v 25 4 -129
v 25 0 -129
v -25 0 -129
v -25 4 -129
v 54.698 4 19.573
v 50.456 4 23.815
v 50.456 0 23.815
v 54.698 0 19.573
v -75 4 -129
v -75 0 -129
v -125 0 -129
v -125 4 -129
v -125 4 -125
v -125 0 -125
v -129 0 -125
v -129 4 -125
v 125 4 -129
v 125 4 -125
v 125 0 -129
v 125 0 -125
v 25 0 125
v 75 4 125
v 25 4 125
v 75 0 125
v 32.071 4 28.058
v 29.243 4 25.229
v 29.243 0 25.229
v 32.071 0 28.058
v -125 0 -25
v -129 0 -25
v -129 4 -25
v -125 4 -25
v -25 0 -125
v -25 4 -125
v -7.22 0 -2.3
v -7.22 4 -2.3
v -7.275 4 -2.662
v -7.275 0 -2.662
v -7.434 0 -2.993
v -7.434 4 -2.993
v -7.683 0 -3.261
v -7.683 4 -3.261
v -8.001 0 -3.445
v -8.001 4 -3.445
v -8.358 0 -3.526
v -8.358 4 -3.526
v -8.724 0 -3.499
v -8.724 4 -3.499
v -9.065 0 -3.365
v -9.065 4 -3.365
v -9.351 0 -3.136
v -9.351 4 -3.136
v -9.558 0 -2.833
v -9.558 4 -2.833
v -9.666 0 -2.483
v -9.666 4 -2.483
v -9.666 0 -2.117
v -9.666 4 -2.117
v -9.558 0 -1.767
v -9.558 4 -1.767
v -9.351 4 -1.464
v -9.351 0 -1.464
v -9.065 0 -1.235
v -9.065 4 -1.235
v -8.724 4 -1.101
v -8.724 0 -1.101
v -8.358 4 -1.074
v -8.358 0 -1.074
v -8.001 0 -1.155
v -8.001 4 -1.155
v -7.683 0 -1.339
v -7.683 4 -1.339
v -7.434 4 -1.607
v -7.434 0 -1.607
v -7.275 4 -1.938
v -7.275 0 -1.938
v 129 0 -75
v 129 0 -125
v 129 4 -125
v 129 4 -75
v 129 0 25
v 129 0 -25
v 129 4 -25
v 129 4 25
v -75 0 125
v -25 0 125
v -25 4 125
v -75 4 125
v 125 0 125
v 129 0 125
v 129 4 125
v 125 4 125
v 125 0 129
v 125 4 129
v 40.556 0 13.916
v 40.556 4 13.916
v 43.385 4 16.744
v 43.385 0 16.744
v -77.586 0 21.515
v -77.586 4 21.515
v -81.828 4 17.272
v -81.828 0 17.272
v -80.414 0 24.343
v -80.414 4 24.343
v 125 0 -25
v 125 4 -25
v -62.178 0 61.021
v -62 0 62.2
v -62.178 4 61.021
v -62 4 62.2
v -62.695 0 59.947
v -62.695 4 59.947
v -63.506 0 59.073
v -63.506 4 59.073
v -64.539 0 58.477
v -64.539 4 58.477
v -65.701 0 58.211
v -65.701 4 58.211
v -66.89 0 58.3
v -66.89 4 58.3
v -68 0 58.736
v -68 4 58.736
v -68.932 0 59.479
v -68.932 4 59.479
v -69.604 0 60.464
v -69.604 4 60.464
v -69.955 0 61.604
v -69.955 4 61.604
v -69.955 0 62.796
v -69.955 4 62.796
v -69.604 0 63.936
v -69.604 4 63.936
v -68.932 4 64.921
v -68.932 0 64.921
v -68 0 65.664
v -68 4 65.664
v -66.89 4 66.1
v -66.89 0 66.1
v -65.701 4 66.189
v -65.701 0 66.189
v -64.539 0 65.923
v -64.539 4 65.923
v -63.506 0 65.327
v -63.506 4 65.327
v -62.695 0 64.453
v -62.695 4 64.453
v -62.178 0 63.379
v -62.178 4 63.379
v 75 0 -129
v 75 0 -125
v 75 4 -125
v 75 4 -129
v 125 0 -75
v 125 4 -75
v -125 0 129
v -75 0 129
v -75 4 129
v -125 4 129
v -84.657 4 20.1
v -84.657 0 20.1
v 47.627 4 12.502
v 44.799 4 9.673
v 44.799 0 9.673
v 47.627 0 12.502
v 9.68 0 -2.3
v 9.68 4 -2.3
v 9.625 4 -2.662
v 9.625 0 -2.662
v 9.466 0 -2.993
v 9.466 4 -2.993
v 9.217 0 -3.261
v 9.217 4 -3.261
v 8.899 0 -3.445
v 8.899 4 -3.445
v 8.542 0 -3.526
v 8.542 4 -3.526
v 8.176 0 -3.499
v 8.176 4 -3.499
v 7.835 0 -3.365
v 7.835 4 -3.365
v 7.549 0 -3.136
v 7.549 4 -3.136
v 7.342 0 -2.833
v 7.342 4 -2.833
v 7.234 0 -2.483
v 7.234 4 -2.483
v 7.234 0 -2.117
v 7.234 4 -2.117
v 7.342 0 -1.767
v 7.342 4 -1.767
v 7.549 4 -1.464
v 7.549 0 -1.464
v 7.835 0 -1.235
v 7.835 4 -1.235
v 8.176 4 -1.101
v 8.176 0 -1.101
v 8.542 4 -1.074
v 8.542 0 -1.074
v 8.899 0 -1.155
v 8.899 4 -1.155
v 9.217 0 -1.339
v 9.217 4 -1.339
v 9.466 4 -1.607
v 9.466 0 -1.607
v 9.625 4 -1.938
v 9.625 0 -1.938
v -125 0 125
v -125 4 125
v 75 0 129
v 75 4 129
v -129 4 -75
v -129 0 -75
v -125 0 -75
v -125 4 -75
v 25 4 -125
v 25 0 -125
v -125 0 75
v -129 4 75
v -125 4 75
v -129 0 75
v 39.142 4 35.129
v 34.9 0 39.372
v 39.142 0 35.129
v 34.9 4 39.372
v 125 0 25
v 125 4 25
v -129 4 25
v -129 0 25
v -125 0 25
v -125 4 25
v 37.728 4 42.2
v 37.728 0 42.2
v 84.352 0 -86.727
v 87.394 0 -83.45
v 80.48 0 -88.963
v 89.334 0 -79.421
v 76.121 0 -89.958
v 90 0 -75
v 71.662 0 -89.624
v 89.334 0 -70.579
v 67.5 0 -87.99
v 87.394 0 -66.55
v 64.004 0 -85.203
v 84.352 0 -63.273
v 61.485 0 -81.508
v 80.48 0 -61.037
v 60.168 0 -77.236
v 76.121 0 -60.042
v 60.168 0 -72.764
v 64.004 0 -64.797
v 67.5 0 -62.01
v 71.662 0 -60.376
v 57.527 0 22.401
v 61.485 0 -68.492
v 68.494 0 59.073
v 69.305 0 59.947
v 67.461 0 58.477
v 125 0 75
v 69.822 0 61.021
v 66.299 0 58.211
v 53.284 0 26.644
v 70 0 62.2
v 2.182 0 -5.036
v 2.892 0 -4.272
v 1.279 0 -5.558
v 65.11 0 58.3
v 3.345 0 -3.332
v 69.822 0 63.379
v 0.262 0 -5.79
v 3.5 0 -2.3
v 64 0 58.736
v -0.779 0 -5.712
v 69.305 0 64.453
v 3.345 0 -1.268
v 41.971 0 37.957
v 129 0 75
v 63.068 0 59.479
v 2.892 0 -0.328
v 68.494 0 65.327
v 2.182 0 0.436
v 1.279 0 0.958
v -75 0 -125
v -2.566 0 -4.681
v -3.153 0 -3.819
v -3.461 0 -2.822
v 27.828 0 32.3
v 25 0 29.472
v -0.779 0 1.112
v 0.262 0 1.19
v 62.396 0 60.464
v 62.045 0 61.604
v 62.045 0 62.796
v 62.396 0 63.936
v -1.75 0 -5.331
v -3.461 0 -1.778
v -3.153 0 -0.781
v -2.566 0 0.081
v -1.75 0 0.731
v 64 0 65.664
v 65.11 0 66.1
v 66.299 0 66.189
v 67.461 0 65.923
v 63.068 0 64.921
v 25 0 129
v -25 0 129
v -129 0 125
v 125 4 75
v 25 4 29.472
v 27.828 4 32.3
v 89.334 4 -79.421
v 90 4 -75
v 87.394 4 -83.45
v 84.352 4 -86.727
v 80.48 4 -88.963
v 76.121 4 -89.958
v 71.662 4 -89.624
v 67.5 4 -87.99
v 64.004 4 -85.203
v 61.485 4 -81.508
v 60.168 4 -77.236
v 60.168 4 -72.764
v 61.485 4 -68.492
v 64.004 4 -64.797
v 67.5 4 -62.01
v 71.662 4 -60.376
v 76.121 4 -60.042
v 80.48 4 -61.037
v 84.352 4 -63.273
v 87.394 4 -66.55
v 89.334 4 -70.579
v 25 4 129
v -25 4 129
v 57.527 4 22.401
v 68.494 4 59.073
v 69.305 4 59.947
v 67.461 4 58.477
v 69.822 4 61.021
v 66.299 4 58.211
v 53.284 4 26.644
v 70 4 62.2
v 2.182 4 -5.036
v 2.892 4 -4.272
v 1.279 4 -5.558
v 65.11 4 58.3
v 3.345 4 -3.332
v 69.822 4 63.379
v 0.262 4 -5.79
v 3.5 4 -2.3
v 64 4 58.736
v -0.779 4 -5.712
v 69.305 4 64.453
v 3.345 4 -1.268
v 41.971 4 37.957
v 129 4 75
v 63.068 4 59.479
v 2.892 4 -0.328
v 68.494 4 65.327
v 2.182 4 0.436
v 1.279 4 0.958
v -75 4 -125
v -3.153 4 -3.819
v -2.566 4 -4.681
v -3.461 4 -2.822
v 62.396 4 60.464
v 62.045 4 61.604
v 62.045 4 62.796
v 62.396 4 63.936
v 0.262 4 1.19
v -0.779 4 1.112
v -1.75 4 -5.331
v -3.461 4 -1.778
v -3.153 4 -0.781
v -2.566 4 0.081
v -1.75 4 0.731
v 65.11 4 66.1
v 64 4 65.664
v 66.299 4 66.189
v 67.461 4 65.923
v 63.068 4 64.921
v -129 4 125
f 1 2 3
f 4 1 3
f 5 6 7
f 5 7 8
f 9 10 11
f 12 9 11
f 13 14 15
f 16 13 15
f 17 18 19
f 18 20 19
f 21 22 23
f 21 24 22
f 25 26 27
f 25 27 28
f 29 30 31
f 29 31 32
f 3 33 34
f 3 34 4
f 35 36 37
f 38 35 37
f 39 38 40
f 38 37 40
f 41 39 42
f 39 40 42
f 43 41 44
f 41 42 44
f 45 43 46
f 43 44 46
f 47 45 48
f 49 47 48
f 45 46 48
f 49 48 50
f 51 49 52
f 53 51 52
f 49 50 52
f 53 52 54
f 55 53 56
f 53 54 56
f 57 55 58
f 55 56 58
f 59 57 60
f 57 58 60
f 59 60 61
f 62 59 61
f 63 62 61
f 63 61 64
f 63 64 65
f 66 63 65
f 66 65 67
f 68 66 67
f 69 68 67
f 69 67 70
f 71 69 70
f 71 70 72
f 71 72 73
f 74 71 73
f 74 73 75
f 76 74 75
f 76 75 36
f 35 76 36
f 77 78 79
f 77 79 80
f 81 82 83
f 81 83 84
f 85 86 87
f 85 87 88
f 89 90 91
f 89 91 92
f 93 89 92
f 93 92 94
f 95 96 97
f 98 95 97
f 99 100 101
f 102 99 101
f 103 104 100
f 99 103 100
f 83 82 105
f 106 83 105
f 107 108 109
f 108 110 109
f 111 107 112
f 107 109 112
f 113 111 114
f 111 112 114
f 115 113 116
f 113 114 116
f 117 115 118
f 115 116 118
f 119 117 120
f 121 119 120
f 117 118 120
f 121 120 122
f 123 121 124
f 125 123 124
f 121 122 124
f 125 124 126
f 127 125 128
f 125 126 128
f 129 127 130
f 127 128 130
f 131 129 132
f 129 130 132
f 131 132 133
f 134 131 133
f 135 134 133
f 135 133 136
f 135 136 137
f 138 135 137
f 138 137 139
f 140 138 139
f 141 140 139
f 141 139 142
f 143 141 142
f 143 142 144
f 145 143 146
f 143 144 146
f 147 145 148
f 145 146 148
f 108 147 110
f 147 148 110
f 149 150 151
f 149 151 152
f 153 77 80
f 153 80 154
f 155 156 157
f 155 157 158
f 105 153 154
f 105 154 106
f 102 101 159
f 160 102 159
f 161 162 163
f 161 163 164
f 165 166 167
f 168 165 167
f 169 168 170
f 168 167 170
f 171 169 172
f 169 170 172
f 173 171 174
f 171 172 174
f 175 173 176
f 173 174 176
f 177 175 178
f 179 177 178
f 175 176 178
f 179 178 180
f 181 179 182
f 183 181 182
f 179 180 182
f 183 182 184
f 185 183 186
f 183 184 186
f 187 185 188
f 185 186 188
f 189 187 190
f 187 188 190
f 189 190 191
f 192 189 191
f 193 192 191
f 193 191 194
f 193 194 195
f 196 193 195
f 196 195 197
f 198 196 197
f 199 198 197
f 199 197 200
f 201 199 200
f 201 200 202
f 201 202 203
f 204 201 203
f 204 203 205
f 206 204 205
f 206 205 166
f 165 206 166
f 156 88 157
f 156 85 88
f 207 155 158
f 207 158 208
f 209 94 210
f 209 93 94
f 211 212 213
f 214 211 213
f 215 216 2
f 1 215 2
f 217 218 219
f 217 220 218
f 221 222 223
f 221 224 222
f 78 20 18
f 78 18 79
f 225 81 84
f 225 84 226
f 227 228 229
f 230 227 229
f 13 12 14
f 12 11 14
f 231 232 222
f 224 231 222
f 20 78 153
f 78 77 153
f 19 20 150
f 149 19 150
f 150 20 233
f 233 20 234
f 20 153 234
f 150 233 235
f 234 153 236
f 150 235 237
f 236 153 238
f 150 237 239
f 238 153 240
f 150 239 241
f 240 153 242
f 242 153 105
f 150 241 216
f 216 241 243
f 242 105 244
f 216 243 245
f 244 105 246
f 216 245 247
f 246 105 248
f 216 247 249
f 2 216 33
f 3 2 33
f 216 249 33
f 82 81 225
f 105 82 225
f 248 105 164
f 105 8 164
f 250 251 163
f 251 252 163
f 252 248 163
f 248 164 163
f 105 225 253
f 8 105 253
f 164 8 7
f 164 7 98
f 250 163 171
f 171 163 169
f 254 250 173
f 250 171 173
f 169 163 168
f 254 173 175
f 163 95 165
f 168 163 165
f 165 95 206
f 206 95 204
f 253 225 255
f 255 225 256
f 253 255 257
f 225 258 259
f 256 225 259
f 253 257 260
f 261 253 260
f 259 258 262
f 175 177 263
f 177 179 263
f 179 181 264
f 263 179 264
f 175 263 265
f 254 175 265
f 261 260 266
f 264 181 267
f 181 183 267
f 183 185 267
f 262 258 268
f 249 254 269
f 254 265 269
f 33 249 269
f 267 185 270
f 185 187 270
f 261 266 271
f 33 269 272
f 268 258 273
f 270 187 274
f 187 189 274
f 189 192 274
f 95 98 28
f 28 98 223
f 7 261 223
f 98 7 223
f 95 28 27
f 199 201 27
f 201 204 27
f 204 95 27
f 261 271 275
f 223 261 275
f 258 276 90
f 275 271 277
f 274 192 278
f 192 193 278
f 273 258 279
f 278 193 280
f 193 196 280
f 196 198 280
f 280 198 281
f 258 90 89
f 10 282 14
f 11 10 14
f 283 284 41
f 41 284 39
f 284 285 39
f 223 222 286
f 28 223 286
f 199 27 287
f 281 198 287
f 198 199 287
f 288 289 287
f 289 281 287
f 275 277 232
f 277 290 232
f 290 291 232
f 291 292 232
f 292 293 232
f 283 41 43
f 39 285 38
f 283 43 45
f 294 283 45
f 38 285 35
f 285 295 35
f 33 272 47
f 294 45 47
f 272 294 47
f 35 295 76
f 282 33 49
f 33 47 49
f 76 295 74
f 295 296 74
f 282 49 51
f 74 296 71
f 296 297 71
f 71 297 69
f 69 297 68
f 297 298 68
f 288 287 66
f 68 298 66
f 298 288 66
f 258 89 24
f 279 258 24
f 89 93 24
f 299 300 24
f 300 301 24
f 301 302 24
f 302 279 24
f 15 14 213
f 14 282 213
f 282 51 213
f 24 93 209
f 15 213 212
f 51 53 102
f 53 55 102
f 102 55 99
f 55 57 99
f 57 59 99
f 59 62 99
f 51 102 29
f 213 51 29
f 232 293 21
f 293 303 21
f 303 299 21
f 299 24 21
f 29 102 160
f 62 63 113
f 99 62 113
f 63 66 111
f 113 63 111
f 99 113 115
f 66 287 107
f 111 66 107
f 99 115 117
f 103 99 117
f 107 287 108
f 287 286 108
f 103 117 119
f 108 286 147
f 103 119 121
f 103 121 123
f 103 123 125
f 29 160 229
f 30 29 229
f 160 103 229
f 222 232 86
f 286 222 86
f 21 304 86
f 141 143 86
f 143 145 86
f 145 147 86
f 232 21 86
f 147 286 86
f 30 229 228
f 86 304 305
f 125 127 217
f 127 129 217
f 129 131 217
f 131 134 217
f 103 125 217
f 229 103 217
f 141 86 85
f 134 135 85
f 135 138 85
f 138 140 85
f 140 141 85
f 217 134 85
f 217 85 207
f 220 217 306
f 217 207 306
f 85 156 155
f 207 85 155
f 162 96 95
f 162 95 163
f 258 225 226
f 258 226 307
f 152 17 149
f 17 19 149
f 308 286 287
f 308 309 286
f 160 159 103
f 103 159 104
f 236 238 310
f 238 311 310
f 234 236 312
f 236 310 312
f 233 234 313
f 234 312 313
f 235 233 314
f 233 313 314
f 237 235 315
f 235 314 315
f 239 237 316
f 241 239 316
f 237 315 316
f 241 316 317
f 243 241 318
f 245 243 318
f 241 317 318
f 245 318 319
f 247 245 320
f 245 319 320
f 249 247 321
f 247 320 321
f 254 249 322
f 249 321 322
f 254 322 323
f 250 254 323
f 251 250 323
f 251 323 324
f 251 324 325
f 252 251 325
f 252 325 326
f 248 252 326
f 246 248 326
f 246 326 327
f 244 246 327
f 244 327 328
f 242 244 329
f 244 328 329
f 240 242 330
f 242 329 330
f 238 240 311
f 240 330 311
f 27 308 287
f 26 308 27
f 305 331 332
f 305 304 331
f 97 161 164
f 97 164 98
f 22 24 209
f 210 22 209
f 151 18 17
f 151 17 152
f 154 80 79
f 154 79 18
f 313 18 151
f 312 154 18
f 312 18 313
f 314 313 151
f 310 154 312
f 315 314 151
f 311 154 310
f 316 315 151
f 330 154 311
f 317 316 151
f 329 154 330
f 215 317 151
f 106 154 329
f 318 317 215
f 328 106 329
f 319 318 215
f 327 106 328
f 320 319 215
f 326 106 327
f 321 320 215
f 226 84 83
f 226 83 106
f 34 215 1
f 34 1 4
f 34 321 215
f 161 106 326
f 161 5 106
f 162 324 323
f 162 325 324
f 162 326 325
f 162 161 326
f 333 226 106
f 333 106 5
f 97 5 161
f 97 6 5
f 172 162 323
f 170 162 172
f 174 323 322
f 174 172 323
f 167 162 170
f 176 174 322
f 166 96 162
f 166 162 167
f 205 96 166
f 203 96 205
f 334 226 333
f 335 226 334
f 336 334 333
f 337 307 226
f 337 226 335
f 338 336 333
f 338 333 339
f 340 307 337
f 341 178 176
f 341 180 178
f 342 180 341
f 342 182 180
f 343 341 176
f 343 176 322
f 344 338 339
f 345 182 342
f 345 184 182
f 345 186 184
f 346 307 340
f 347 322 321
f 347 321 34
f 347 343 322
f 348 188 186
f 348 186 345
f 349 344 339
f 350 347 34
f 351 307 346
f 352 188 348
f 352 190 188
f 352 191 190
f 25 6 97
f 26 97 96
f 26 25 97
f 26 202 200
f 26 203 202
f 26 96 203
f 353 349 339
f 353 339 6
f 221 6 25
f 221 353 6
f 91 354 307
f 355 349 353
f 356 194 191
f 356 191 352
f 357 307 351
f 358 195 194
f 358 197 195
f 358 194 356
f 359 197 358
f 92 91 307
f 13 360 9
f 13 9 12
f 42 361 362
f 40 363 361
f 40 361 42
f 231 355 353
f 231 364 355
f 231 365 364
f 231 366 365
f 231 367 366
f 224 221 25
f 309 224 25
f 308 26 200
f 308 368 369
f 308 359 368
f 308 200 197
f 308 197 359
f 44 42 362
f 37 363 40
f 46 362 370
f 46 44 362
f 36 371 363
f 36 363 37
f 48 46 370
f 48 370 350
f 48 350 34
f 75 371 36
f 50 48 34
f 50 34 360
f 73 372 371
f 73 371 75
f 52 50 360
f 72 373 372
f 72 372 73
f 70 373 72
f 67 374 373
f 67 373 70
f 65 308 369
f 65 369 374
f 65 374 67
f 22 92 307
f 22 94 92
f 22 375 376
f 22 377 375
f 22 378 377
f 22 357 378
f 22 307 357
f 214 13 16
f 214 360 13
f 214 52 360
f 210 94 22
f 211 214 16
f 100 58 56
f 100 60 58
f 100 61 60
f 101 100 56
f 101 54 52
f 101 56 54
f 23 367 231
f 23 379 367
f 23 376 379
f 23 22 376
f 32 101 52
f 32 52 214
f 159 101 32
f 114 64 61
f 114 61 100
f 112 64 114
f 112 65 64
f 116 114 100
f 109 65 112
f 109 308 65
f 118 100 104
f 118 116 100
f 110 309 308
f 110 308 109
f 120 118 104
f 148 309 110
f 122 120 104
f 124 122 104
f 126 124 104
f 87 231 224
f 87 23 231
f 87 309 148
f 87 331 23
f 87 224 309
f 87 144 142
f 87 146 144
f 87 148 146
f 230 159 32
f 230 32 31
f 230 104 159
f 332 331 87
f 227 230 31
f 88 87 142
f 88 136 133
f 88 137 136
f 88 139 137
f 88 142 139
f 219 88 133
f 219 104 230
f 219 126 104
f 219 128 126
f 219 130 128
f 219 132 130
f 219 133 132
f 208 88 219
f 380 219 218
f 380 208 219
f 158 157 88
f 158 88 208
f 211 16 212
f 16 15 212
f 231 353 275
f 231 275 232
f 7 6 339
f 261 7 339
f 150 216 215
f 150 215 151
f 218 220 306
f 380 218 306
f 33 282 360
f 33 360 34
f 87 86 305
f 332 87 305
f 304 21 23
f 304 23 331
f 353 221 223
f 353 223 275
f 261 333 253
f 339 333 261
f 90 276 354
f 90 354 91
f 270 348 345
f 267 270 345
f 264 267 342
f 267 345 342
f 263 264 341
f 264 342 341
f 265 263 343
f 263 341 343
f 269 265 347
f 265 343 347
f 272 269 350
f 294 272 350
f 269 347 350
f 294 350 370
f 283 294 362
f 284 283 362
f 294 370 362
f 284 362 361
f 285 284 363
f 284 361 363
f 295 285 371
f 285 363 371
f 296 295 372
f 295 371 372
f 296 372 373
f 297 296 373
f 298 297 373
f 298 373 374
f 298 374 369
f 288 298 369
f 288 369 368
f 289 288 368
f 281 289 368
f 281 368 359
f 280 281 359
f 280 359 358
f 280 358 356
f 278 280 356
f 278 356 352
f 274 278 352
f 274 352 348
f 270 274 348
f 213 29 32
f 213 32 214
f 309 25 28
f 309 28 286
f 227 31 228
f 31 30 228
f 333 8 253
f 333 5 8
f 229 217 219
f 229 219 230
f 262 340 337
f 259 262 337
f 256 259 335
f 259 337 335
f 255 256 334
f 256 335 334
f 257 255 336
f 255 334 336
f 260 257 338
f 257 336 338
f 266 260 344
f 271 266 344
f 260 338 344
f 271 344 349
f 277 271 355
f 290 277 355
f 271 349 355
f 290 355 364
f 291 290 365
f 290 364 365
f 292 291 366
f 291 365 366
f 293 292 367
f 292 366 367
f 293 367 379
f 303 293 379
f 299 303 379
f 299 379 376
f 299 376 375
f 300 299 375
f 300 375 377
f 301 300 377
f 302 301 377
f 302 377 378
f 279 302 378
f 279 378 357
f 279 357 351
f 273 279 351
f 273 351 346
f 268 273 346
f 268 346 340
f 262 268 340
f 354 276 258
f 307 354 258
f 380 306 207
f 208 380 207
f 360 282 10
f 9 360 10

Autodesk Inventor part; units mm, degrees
ref_plane "YZ Plane" through (0, 0, 0) normal (1, 0, 0) x (0, 1, 0)
ref_plane "XZ Plane" through (0, 0, 0) normal (0, 1, 0) x (-1, 0, 0)
ref_plane "XY Plane" through (0, 0, 0) normal (0, 0, 1) x (1, 0, 0)
sketch "Sketch1" plane through (0, 0, 0) normal (0, 1, 0) x (-1, 0, 0)
  line L0 (-125, 125) -> (125, 125)
  line L1 (125, 125) -> (125, -125)
  line L2 (125, -125) -> (-125, -125)
  line L3 (-125, -125) -> (-125, 125)
  line L4 (-125, 125) -> (125, -125) construction
  line L5 (125, 125) -> (-125, -125) construction
  line L6 (125, -125) -> (75, -125)
  line L7 (75, -125) -> (75, -129)
  line L8 (75, -129) -> (125, -129)
  line L9 (125, -129) -> (125, -125)
  line L10 (125, -125) -> (129, -125)
  line L11 (129, -125) -> (129, -75)
  line L12 (129, -75) -> (125, -75)
  line L13 (125, -75) -> (125, -125)
  line L14 (-125, -125) -> (-129, -125)
  line L15 (-129, -125) -> (-129, -75)
  line L16 (-129, -75) -> (-125, -75)
  line L17 (-125, -75) -> (-125, -125)
  line L18 (125, 125) -> (75, 125)
  line L19 (75, 125) -> (75, 129)
  line L20 (75, 129) -> (125, 129)
  line L21 (125, 129) -> (125, 125)
  line L22 (75, -129) -> (75, -125)
  line L23 (75, -125) -> (25, -125)
  line L24 (25, -125) -> (25, -129)
  line L25 (25, -129) -> (75, -129)
  line L26 (25, -129) -> (25, -125)
  line L27 (25, -125) -> (-25, -125)
  line L28 (-25, -125) -> (-25, -129)
  line L29 (-25, -129) -> (25, -129)
  line L30 (-25, -129) -> (-25, -125)
  line L31 (-25, -125) -> (-75, -125)
  line L32 (-75, -125) -> (-75, -129)
  line L33 (-75, -129) -> (-25, -129)
  line L34 (-75, -129) -> (-75, -125)
  line L35 (-75, -125) -> (-125, -125)
  line L36 (-125, -125) -> (-125, -129)
  line L37 (-125, -129) -> (-75, -129)
  line L38 (125, -75) -> (129, -75)
  line L39 (125, -25) -> (125, -75)
  line L40 (129, -25) -> (125, -25)
  line L41 (129, -75) -> (129, -25)
  line L42 (125, -25) -> (129, -25)
  line L43 (125, 25) -> (125, -25)
  line L44 (129, 25) -> (125, 25)
  line L45 (129, -25) -> (129, 25)
  line L46 (125, 25) -> (129, 25)
  line L47 (125, 75) -> (125, 25)
  line L48 (129, 75) -> (125, 75)
  line L49 (129, 25) -> (129, 75)
  line L50 (125, 75) -> (129, 75)
  line L51 (125, 125) -> (125, 75)
  line L52 (129, 125) -> (125, 125)
  line L53 (129, 75) -> (129, 125)
  line L54 (-125, -75) -> (-129, -75)
  line L55 (-129, -75) -> (-129, -25)
  line L56 (-129, -25) -> (-125, -25)
  line L57 (-125, -25) -> (-125, -75)
  line L58 (-125, -25) -> (-129, -25)
  line L59 (-129, -25) -> (-129, 25)
  line L60 (-129, 25) -> (-125, 25)
  line L61 (-125, 25) -> (-125, -25)
  line L62 (-125, 25) -> (-129, 25)
  line L63 (-129, 25) -> (-129, 75)
  line L64 (-129, 75) -> (-125, 75)
  line L65 (-125, 75) -> (-125, 25)
  line L66 (-125, 75) -> (-129, 75)
  line L67 (-129, 75) -> (-129, 125)
  line L68 (-129, 125) -> (-125, 125)
  line L69 (-125, 125) -> (-125, 75)
  line L70 (75, 125) -> (25, 125)
  line L71 (25, 125) -> (25, 129)
  line L72 (25, 129) -> (75, 129)
  line L73 (75, 129) -> (75, 125)
  line L74 (25, 125) -> (-25, 125)
  line L75 (-25, 125) -> (-25, 129)
  line L76 (-25, 129) -> (25, 129)
  line L77 (25, 129) -> (25, 125)
  line L78 (-25, 125) -> (-75, 125)
  line L79 (-75, 125) -> (-75, 129)
  line L80 (-75, 129) -> (-25, 129)
  line L81 (-25, 129) -> (-25, 125)
  line L82 (-75, 125) -> (-125, 125)
  line L83 (-125, 125) -> (-125, 129)
  line L84 (-125, 129) -> (-75, 129)
  line L85 (-75, 129) -> (-75, 125)
  point P0 (0, 0)
  dimension "d0" = 250
  dimension "d1" = 250
  dimension "d2" = 50
  dimension "d3" = 4
  dimension "d4" = 4
  dimension "d5" = 50
  dimension "d6" = 4
  dimension "d7" = 50
  dimension "d8" = 50
  dimension "d9" = 4
  dimension "d12" = 50
  dimension "d19" = 50
  dimension "d26" = 50
  dimension "d33" = 50
extrude "Extrusion1" add sketch "Sketch1" along normal blind 4 contours L83 L84 L79 L0 | L0 L1 L2 L3 | L3 L64 L67 L68 | L75 L76 L71 L0 | L3 L56 L59 L60 | L19 L20 L21 L0 | L3 L14 L15 L16 | L52 L53 L48 L1 | L2 L32 L37 L36 | L44 L45 L40 L1 | L2 L24 L29 L28 | L12 L11 L10 L1 | L2 L9 L8 L7
sketch "Sketch2" plane through (0, 4, 0) normal (0, 1, 0) x (1, 0, 0)
  line L0 (25, -125) -> (75, -125) construction
  circle A0 centre (0, 2.3) radius 3.5
  line L1 (-8.45, 2.3) -> (8.45, 2.3) construction
  line L2 (-8.45, 1.0705) -> (8.45, 1.0705) construction
  line L3 (8.45, 3.5295) -> (-8.45, 3.5295) construction
  arc A1 (-8.45, 3.5295) -> (-8.45, 1.0705) centre (-8.45, 2.3) ccw construction
  arc A2 (8.45, 1.0705) -> (8.45, 3.5295) centre (8.45, 2.3) ccw construction
  circle A3 centre (8.45, 2.3) radius 1.2295
  circle A4 centre (-8.45, 2.3) radius 1.2295
  circle A5 centre (-66, -62.2) radius 4
  circle A6 centre (66, -62.2) radius 4
  line L4 (0, 180.6) -> (0, -180.6) construction
  line L5 (-93.2324, -124) -> (95.467, -124) construction
  line L6 (-129, -125) -> (-125, -125) projected
  line L7 (25, -29.4721) -> (29.2426, -25.2294)
  line L8 (44.799, -9.6731) -> (47.6274, -12.5015)
  line L9 (47.6274, -12.5015) -> (43.3848, -16.7442)
  line L10 (27.8284, -32.3005) -> (25, -29.4721)
  line L11 (34.8995, -39.3716) -> (39.1421, -35.1289)
  line L12 (54.6985, -19.5726) -> (57.5269, -22.401)
  line L13 (57.5269, -22.401) -> (53.2843, -26.6437)
  line L14 (37.7279, -42.2) -> (34.8995, -39.3716)
  line L15 (40.5563, -13.9157) -> (43.3848, -16.7442)
  line L16 (29.2426, -25.2294) -> (32.0711, -28.0579)
  line L17 (39.1421, -35.1289) -> (41.9706, -37.9574)
  line L18 (50.4558, -23.8152) -> (53.2843, -26.6437)
  line L19 (40.5563, -13.9157) -> (44.799, -9.6731)
  line L20 (29.2426, -25.2294) -> (40.5563, -13.9157) construction
  line L21 (43.3848, -16.7442) -> (32.0711, -28.0579) construction
  line L22 (50.4558, -23.8152) -> (54.6985, -19.5726)
  line L23 (53.2843, -26.6437) -> (41.9706, -37.9574) construction
  line L24 (32.0711, -28.0579) -> (27.8284, -32.3005)
  line L25 (39.1421, -35.1289) -> (50.4558, -23.8152) construction
  line L26 (41.9706, -37.9574) -> (37.7279, -42.2)
  point P0 (0, 0)
  point P1 (26.4142, -30.8863)
  dimension "d46" = 7
  dimension "d47" = 16.9
  dimension "d48" = 1.2295
  dimension "d52" = 8
  dimension "d53" = 132
  dimension "d54" = 61.8
  dimension "d55" = 1
  dimension "d56" = 64.5
  dimension "d57" = 10
  dimension "d58" = 4
  dimension "d59" = 6
  dimension "d60" = 6
  dimension "d61" = 45
  dimension "d62" = 20
  dimension "d63" = 28
  dimension "d64" = 25
extrude "Extrusion2" cut sketch "Sketch2" against normal up to next
sketch "Sketch3" plane through (0, 4, 0) normal (0, 1, 0) x (1, 0, 0)
  point P0 (0, 0)
sketch "Sketch4" plane through (0, 4, 0) normal (0, 1, 0) x (1, 0, 0)
  circle A0 centre (75, 75) radius 15
  line L0 (125, 25) -> (125, 75) projected
  line L1 (75, 125) -> (25, 125) projected
  point P0 (0, 0)
  dimension "d65" = 30
  dimension "d66" = 50
  dimension "d67" = 50
extrude "Extrusion3" cut sketch "Sketch4" against normal through all
sketch "Sketch5" plane through (0, 4, 0) normal (0, 1, 0) x (1, 0, 0)
  circle A0 centre (75, 75) radius 15 projected
  line L0 (54.6985, -19.5726) -> (57.5269, -22.401) projected
  line L1 (57.5269, -22.401) -> (53.2843, -26.6437) projected
  line L2 (53.2843, -26.6437) -> (50.4558, -23.8152) projected
  line L3 (50.4558, -23.8152) -> (54.6985, -19.5726) projected
  circle A1 centre (8.45, 2.3) radius 1.2295 projected
  circle A2 centre (0, 2.3) radius 3.5 projected
  line L4 (39.1421, -35.1289) -> (41.9706, -37.9574) projected
  line L5 (41.9706, -37.9574) -> (37.7279, -42.2) projected
  line L6 (37.7279, -42.2) -> (34.8995, -39.3716) projected
  line L7 (34.8995, -39.3716) -> (39.1421, -35.1289) projected
  line L8 (44.799, -9.6731) -> (47.6274, -12.5015) projected
  line L9 (47.6274, -12.5015) -> (43.3848, -16.7442) projected
  line L10 (43.3848, -16.7442) -> (40.5563, -13.9157) projected
  line L11 (40.5563, -13.9157) -> (44.799, -9.6731) projected
  circle A3 centre (66, -62.2) radius 4 projected
  circle A4 centre (-8.45, 2.3) radius 1.2295 projected
  circle A5 centre (-66, -62.2) radius 4 projected
  line L12 (29.2426, -25.2294) -> (32.0711, -28.0579) projected
  line L13 (32.0711, -28.0579) -> (27.8284, -32.3005) projected
  line L14 (27.8284, -32.3005) -> (25, -29.4721) projected
  line L15 (25, -29.4721) -> (29.2426, -25.2294) projected
  line L16 (-129, -125) -> (-125, -125) projected
  line L17 (-125, -125) -> (-125, -129) projected
  line L18 (-125, -129) -> (-75, -129) projected
  line L19 (-75, -129) -> (-75, -125) projected
  line L20 (-75, -125) -> (-25, -125) projected
  line L21 (-25, -125) -> (-25, -129) projected
  line L22 (-25, -129) -> (25, -129) projected
  line L23 (25, -129) -> (25, -125) projected
  line L24 (25, -125) -> (75, -125) projected
  line L25 (75, -125) -> (75, -129) projected
  line L26 (75, -129) -> (125, -129) projected
  line L27 (125, -129) -> (125, -125) projected
  line L28 (125, -125) -> (129, -125) projected
  line L29 (129, -125) -> (129, -75) projected
  line L30 (129, -75) -> (125, -75) projected
  line L31 (125, -75) -> (125, -25) projected
  line L32 (125, -25) -> (129, -25) projected
  line L33 (129, -25) -> (129, 25) projected
  line L34 (129, 25) -> (125, 25) projected
  line L35 (125, 25) -> (125, 75) projected
  line L36 (125, 75) -> (129, 75) projected
  line L37 (129, 75) -> (129, 125) projected
  line L38 (129, 125) -> (125, 125) projected
  line L39 (125, 125) -> (125, 129) projected
  line L40 (125, 129) -> (75, 129) projected
  line L41 (75, 129) -> (75, 125) projected
  line L42 (75, 125) -> (25, 125) projected
  line L43 (25, 125) -> (25, 129) projected
  line L44 (25, 129) -> (-25, 129) projected
  line L45 (-25, 129) -> (-25, 125) projected
  line L46 (-25, 125) -> (-75, 125) projected
  line L47 (-75, 125) -> (-75, 129) projected
  line L48 (-75, 129) -> (-125, 129) projected
  line L49 (-125, 129) -> (-125, 125) projected
  line L50 (-125, 125) -> (-129, 125) projected
  line L51 (-129, 125) -> (-129, 75) projected
  line L52 (-129, 75) -> (-125, 75) projected
  line L53 (-125, 75) -> (-125, 25) projected
  line L54 (-125, 25) -> (-129, 25) projected
  line L55 (-129, 25) -> (-129, -25) projected
  line L56 (-129, -25) -> (-125, -25) projected
  line L57 (-125, -25) -> (-125, -75) projected
  line L58 (-125, -75) -> (-129, -75) projected
  line L59 (-129, -75) -> (-129, -125) projected
  line L60 (-80.4142, -24.3431) -> (-77.5858, -21.5147)
  line L61 (-77.5858, -21.5147) -> (-81.8284, -17.2721)
  line L62 (-81.8284, -17.2721) -> (-84.6569, -20.1005)
  line L63 (-84.6569, -20.1005) -> (-80.4142, -24.3431)
  line L64 (-79, -30) -> (-71.9289, -22.9289) construction
  line L65 (-83.2426, -18.6863) -> (-79, -22.9289) construction
  line L66 (-79, -22.9289) -> (-75.4645, -26.4645) construction
  point P0 (0, 0)
  dimension "d70" = 45
  dimension "d71" = 4
  dimension "d72" = 6
  dimension "d73" = 10
  dimension "d74" = 95
  dimension "d75" = 46
  dimension "d78" = 5
extrude "Extrusion4" cut sketch "Sketch5" against normal through all contours L63 L62 L61 L60
properties part number "FloorPlateBottom_V2" material "Wood (Oak)"
